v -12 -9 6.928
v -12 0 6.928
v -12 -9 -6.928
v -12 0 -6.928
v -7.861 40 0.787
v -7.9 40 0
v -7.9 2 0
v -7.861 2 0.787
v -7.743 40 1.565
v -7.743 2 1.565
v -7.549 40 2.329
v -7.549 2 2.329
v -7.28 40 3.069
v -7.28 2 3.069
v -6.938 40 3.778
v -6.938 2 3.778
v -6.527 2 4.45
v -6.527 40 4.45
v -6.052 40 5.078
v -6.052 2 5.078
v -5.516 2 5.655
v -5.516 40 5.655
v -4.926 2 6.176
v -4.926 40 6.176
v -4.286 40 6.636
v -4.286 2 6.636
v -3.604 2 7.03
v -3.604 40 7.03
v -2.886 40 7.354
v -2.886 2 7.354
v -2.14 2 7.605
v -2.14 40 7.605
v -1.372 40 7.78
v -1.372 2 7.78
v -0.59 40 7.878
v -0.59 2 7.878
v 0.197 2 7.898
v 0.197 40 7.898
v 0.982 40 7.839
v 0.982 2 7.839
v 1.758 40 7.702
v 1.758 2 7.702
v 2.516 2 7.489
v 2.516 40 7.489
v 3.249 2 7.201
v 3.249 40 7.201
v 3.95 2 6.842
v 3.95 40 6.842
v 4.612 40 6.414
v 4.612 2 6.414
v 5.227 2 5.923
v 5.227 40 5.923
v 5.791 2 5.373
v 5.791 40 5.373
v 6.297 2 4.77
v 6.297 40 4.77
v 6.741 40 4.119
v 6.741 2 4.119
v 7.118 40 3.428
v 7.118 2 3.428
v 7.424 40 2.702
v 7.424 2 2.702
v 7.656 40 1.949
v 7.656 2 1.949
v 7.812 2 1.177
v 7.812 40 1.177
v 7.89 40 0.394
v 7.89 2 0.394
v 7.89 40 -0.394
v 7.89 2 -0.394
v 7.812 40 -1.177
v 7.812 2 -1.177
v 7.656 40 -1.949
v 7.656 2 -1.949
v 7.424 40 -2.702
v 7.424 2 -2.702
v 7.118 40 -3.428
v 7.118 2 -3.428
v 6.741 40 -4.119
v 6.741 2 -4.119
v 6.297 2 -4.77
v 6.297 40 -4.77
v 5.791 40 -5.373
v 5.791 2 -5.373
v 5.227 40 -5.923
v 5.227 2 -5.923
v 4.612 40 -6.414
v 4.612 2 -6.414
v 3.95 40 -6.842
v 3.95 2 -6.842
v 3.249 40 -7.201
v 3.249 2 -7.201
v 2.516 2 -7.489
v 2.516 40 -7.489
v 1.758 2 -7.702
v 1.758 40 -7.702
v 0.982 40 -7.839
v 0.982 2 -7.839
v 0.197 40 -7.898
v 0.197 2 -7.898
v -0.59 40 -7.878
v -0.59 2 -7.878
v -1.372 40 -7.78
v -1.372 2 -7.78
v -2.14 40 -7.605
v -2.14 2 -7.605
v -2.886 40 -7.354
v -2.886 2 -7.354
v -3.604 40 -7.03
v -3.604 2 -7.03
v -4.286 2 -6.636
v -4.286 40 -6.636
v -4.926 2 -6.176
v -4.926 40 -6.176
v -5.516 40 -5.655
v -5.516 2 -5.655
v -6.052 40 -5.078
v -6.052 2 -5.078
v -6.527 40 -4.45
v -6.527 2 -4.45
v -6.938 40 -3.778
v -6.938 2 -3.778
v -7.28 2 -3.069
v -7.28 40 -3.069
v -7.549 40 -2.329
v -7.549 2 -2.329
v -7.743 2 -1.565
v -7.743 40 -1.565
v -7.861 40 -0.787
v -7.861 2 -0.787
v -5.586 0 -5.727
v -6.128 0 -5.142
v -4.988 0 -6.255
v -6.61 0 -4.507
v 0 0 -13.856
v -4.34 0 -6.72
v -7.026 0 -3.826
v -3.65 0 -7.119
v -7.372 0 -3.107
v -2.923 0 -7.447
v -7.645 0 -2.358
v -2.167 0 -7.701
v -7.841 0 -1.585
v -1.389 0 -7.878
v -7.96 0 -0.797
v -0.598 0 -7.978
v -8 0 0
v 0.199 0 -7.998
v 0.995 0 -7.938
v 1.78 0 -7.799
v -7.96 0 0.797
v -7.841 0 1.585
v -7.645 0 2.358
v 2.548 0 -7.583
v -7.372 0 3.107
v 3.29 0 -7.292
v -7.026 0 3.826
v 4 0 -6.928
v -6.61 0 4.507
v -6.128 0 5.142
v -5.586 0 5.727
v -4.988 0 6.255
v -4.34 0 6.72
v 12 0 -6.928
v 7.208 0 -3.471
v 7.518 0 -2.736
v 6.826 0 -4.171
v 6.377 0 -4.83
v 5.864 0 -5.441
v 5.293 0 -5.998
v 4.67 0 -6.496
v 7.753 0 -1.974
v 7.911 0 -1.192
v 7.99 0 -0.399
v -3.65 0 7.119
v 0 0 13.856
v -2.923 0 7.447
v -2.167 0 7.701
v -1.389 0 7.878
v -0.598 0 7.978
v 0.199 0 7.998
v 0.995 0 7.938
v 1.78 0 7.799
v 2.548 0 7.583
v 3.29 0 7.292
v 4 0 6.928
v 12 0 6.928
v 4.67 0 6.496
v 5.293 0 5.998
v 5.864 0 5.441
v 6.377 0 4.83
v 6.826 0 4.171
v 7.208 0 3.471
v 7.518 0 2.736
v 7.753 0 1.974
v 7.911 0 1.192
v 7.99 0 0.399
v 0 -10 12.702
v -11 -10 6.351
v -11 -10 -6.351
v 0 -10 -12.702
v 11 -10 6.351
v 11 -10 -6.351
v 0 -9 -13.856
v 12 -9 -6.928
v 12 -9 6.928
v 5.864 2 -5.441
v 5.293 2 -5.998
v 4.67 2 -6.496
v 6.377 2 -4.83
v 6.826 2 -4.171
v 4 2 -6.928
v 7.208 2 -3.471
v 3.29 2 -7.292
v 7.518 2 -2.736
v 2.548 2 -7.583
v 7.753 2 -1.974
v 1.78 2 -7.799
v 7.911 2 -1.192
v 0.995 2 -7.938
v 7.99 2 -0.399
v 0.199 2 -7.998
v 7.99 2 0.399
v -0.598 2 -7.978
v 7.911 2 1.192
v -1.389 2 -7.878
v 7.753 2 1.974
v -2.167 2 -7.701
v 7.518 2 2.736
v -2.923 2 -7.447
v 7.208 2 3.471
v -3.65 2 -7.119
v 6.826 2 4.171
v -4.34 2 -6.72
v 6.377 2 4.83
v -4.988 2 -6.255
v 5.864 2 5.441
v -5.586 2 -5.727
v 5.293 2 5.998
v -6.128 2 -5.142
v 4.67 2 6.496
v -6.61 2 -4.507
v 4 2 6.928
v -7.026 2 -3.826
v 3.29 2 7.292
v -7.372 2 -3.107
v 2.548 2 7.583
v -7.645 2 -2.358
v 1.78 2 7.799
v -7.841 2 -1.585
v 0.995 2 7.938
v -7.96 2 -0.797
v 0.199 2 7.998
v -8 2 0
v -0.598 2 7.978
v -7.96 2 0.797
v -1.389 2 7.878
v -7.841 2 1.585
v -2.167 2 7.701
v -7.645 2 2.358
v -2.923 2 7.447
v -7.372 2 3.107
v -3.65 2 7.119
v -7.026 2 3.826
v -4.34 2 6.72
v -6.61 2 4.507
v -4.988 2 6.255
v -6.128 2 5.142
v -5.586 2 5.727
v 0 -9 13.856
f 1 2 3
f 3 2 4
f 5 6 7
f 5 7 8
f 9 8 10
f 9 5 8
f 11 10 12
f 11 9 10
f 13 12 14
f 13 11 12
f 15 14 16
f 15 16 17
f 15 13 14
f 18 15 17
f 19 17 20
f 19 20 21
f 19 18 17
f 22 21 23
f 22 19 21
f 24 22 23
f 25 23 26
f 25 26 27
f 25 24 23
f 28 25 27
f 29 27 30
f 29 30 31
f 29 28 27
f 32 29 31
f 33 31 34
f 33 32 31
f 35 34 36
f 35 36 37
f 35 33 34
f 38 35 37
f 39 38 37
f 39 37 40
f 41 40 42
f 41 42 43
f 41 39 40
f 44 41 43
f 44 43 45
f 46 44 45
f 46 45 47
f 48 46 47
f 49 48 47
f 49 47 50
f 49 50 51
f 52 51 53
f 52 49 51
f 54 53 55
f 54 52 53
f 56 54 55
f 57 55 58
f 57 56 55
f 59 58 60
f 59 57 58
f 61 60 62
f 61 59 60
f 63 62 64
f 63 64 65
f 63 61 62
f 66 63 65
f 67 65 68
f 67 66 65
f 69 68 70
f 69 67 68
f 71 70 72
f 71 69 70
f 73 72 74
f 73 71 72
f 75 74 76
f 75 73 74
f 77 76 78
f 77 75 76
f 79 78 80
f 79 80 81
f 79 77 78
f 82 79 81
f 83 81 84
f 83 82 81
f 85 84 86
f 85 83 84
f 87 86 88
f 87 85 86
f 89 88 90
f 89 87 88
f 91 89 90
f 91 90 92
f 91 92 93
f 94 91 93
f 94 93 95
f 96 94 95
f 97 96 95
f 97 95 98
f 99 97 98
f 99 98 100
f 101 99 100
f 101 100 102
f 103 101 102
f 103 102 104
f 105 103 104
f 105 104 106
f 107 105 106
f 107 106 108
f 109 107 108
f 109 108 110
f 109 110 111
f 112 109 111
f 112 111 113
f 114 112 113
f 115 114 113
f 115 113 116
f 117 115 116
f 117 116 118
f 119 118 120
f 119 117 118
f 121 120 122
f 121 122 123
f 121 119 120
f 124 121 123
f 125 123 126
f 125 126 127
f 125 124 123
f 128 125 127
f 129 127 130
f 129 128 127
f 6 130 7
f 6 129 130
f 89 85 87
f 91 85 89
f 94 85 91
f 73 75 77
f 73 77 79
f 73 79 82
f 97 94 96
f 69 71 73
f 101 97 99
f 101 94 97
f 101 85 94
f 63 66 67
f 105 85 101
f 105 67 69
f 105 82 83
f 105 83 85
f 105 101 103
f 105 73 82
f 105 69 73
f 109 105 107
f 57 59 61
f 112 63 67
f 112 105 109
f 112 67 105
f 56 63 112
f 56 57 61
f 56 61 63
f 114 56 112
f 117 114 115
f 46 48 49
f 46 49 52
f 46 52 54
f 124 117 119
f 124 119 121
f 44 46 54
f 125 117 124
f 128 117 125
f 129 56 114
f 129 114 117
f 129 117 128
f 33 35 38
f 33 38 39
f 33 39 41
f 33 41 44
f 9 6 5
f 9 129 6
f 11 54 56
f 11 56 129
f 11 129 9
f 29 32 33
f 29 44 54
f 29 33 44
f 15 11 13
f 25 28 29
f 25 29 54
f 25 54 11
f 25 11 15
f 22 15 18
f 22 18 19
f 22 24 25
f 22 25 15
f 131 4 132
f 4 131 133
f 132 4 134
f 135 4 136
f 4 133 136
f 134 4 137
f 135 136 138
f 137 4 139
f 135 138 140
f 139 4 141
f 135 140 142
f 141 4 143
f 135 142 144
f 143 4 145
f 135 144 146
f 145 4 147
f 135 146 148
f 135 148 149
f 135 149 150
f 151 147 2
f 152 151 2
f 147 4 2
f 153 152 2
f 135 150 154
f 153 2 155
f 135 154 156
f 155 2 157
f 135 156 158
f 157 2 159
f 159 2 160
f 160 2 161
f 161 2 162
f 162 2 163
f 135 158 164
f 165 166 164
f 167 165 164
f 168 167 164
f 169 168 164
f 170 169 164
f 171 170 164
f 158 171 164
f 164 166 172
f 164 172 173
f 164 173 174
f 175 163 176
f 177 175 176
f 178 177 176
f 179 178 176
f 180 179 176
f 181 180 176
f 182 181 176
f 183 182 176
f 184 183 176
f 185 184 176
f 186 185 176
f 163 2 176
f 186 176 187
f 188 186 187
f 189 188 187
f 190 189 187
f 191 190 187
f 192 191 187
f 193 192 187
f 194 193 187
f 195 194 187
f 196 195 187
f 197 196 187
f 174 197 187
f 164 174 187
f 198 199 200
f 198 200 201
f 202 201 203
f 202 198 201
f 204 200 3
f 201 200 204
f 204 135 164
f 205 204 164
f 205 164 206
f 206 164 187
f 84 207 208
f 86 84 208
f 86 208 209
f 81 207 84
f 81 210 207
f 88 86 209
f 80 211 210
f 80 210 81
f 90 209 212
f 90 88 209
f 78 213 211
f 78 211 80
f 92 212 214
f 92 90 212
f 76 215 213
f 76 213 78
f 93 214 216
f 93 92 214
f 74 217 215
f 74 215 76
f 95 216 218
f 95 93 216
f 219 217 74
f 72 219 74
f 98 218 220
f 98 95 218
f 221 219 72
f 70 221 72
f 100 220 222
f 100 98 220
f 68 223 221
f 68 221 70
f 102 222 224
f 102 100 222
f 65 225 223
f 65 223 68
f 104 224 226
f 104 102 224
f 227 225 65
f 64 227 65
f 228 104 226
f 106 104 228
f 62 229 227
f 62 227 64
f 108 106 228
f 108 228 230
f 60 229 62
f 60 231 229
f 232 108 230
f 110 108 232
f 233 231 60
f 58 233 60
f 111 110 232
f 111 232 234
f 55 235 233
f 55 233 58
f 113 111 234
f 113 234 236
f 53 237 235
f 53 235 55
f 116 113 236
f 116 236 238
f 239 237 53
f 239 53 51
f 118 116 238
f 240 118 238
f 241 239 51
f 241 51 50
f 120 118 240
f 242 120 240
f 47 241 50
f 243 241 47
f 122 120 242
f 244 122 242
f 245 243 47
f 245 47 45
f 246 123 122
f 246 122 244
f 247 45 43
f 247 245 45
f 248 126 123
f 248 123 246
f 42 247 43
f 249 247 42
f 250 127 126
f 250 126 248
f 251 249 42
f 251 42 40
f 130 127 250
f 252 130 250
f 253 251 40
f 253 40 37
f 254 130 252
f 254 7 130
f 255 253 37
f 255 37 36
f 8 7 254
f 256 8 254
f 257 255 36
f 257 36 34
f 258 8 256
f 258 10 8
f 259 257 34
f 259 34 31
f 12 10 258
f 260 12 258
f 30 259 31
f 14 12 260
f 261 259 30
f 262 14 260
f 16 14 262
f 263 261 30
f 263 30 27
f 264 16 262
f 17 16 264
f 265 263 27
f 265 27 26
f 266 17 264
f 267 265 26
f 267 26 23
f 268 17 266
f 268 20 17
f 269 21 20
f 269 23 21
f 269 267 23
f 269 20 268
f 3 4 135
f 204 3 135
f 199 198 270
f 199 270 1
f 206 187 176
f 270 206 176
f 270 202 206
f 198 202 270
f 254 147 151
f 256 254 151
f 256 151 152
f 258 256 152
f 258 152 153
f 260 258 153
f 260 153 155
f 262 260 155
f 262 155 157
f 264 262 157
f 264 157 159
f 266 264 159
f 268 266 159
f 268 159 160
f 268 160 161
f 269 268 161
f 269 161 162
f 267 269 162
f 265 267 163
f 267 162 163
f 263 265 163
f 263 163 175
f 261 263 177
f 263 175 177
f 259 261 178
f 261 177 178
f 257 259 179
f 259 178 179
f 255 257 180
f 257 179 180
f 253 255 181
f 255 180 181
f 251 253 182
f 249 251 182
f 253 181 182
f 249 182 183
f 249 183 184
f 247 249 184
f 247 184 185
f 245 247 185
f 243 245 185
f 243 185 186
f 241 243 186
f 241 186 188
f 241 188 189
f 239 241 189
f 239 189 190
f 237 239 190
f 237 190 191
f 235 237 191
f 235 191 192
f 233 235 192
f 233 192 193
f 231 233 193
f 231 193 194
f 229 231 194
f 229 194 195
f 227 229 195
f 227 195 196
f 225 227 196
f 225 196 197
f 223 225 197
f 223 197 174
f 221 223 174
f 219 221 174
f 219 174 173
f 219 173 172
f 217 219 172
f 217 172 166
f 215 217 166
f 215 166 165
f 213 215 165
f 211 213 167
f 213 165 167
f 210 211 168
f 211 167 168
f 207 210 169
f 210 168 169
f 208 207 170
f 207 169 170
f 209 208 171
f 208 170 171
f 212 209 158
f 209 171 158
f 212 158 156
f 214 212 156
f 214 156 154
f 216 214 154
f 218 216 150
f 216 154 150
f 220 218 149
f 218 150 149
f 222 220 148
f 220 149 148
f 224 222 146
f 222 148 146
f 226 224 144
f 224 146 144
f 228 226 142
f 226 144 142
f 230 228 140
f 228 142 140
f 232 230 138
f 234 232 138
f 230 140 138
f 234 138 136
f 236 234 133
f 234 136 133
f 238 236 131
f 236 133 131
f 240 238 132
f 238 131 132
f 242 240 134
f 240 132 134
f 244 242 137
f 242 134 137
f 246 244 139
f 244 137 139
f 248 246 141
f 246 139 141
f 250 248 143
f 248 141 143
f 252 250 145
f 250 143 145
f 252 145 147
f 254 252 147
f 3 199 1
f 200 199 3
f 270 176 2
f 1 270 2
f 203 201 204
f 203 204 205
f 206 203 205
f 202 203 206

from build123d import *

# Parameters (mm, degrees)
F1_DEPTH = 10
F2_SIZE2 = 1
F2_SIZE  = 1
F3_R     = 8
F4_DEPTH = 40
F5_R     = 8
F5_R_2   = 7.9
F6_DEPTH = 38


with BuildPart() as f1:
    # F0 (on Front) → F1 (new body)
    with BuildSketch(Plane.XZ):
        Polygon((0, -13.856406), (12, -6.928203), (12, 6.928203), (0, 13.856406), (-12, 6.928203), (-12, -6.928203), align=None)
    extrude(amount=F1_DEPTH)

    # F2
    f2_edges = [f1.edges().sort_by_distance(p)[0] for p in [
        (6, -10, 10.392305),
        (-6, -10, 10.392305),
        (12, -10, 0),
        (6, -10, -10.392305),
        (-6, -10, -10.392305),
        (-12, -10, 0),
    ]]
    chamfer(f2_edges, length=F2_SIZE, length2=F2_SIZE2)

    # F3 (on face) → F4 (join)
    with BuildSketch(Plane(origin=(0, 0, 0), x_dir=(-1, 0, 0), z_dir=(0, 1, 0))):
        Circle(F3_R)
    extrude(amount=F4_DEPTH)

    # F5 (on face) → F6 (cut)
    with BuildSketch(Plane(origin=(0, 40, 0), x_dir=(-1, 0, 0), z_dir=(0, 1, 0))):
        Circle(F5_R)
        Circle(F5_R_2, mode=Mode.SUBTRACT)
    extrude(amount=-F6_DEPTH, mode=Mode.SUBTRACT)


solid = f1.part
